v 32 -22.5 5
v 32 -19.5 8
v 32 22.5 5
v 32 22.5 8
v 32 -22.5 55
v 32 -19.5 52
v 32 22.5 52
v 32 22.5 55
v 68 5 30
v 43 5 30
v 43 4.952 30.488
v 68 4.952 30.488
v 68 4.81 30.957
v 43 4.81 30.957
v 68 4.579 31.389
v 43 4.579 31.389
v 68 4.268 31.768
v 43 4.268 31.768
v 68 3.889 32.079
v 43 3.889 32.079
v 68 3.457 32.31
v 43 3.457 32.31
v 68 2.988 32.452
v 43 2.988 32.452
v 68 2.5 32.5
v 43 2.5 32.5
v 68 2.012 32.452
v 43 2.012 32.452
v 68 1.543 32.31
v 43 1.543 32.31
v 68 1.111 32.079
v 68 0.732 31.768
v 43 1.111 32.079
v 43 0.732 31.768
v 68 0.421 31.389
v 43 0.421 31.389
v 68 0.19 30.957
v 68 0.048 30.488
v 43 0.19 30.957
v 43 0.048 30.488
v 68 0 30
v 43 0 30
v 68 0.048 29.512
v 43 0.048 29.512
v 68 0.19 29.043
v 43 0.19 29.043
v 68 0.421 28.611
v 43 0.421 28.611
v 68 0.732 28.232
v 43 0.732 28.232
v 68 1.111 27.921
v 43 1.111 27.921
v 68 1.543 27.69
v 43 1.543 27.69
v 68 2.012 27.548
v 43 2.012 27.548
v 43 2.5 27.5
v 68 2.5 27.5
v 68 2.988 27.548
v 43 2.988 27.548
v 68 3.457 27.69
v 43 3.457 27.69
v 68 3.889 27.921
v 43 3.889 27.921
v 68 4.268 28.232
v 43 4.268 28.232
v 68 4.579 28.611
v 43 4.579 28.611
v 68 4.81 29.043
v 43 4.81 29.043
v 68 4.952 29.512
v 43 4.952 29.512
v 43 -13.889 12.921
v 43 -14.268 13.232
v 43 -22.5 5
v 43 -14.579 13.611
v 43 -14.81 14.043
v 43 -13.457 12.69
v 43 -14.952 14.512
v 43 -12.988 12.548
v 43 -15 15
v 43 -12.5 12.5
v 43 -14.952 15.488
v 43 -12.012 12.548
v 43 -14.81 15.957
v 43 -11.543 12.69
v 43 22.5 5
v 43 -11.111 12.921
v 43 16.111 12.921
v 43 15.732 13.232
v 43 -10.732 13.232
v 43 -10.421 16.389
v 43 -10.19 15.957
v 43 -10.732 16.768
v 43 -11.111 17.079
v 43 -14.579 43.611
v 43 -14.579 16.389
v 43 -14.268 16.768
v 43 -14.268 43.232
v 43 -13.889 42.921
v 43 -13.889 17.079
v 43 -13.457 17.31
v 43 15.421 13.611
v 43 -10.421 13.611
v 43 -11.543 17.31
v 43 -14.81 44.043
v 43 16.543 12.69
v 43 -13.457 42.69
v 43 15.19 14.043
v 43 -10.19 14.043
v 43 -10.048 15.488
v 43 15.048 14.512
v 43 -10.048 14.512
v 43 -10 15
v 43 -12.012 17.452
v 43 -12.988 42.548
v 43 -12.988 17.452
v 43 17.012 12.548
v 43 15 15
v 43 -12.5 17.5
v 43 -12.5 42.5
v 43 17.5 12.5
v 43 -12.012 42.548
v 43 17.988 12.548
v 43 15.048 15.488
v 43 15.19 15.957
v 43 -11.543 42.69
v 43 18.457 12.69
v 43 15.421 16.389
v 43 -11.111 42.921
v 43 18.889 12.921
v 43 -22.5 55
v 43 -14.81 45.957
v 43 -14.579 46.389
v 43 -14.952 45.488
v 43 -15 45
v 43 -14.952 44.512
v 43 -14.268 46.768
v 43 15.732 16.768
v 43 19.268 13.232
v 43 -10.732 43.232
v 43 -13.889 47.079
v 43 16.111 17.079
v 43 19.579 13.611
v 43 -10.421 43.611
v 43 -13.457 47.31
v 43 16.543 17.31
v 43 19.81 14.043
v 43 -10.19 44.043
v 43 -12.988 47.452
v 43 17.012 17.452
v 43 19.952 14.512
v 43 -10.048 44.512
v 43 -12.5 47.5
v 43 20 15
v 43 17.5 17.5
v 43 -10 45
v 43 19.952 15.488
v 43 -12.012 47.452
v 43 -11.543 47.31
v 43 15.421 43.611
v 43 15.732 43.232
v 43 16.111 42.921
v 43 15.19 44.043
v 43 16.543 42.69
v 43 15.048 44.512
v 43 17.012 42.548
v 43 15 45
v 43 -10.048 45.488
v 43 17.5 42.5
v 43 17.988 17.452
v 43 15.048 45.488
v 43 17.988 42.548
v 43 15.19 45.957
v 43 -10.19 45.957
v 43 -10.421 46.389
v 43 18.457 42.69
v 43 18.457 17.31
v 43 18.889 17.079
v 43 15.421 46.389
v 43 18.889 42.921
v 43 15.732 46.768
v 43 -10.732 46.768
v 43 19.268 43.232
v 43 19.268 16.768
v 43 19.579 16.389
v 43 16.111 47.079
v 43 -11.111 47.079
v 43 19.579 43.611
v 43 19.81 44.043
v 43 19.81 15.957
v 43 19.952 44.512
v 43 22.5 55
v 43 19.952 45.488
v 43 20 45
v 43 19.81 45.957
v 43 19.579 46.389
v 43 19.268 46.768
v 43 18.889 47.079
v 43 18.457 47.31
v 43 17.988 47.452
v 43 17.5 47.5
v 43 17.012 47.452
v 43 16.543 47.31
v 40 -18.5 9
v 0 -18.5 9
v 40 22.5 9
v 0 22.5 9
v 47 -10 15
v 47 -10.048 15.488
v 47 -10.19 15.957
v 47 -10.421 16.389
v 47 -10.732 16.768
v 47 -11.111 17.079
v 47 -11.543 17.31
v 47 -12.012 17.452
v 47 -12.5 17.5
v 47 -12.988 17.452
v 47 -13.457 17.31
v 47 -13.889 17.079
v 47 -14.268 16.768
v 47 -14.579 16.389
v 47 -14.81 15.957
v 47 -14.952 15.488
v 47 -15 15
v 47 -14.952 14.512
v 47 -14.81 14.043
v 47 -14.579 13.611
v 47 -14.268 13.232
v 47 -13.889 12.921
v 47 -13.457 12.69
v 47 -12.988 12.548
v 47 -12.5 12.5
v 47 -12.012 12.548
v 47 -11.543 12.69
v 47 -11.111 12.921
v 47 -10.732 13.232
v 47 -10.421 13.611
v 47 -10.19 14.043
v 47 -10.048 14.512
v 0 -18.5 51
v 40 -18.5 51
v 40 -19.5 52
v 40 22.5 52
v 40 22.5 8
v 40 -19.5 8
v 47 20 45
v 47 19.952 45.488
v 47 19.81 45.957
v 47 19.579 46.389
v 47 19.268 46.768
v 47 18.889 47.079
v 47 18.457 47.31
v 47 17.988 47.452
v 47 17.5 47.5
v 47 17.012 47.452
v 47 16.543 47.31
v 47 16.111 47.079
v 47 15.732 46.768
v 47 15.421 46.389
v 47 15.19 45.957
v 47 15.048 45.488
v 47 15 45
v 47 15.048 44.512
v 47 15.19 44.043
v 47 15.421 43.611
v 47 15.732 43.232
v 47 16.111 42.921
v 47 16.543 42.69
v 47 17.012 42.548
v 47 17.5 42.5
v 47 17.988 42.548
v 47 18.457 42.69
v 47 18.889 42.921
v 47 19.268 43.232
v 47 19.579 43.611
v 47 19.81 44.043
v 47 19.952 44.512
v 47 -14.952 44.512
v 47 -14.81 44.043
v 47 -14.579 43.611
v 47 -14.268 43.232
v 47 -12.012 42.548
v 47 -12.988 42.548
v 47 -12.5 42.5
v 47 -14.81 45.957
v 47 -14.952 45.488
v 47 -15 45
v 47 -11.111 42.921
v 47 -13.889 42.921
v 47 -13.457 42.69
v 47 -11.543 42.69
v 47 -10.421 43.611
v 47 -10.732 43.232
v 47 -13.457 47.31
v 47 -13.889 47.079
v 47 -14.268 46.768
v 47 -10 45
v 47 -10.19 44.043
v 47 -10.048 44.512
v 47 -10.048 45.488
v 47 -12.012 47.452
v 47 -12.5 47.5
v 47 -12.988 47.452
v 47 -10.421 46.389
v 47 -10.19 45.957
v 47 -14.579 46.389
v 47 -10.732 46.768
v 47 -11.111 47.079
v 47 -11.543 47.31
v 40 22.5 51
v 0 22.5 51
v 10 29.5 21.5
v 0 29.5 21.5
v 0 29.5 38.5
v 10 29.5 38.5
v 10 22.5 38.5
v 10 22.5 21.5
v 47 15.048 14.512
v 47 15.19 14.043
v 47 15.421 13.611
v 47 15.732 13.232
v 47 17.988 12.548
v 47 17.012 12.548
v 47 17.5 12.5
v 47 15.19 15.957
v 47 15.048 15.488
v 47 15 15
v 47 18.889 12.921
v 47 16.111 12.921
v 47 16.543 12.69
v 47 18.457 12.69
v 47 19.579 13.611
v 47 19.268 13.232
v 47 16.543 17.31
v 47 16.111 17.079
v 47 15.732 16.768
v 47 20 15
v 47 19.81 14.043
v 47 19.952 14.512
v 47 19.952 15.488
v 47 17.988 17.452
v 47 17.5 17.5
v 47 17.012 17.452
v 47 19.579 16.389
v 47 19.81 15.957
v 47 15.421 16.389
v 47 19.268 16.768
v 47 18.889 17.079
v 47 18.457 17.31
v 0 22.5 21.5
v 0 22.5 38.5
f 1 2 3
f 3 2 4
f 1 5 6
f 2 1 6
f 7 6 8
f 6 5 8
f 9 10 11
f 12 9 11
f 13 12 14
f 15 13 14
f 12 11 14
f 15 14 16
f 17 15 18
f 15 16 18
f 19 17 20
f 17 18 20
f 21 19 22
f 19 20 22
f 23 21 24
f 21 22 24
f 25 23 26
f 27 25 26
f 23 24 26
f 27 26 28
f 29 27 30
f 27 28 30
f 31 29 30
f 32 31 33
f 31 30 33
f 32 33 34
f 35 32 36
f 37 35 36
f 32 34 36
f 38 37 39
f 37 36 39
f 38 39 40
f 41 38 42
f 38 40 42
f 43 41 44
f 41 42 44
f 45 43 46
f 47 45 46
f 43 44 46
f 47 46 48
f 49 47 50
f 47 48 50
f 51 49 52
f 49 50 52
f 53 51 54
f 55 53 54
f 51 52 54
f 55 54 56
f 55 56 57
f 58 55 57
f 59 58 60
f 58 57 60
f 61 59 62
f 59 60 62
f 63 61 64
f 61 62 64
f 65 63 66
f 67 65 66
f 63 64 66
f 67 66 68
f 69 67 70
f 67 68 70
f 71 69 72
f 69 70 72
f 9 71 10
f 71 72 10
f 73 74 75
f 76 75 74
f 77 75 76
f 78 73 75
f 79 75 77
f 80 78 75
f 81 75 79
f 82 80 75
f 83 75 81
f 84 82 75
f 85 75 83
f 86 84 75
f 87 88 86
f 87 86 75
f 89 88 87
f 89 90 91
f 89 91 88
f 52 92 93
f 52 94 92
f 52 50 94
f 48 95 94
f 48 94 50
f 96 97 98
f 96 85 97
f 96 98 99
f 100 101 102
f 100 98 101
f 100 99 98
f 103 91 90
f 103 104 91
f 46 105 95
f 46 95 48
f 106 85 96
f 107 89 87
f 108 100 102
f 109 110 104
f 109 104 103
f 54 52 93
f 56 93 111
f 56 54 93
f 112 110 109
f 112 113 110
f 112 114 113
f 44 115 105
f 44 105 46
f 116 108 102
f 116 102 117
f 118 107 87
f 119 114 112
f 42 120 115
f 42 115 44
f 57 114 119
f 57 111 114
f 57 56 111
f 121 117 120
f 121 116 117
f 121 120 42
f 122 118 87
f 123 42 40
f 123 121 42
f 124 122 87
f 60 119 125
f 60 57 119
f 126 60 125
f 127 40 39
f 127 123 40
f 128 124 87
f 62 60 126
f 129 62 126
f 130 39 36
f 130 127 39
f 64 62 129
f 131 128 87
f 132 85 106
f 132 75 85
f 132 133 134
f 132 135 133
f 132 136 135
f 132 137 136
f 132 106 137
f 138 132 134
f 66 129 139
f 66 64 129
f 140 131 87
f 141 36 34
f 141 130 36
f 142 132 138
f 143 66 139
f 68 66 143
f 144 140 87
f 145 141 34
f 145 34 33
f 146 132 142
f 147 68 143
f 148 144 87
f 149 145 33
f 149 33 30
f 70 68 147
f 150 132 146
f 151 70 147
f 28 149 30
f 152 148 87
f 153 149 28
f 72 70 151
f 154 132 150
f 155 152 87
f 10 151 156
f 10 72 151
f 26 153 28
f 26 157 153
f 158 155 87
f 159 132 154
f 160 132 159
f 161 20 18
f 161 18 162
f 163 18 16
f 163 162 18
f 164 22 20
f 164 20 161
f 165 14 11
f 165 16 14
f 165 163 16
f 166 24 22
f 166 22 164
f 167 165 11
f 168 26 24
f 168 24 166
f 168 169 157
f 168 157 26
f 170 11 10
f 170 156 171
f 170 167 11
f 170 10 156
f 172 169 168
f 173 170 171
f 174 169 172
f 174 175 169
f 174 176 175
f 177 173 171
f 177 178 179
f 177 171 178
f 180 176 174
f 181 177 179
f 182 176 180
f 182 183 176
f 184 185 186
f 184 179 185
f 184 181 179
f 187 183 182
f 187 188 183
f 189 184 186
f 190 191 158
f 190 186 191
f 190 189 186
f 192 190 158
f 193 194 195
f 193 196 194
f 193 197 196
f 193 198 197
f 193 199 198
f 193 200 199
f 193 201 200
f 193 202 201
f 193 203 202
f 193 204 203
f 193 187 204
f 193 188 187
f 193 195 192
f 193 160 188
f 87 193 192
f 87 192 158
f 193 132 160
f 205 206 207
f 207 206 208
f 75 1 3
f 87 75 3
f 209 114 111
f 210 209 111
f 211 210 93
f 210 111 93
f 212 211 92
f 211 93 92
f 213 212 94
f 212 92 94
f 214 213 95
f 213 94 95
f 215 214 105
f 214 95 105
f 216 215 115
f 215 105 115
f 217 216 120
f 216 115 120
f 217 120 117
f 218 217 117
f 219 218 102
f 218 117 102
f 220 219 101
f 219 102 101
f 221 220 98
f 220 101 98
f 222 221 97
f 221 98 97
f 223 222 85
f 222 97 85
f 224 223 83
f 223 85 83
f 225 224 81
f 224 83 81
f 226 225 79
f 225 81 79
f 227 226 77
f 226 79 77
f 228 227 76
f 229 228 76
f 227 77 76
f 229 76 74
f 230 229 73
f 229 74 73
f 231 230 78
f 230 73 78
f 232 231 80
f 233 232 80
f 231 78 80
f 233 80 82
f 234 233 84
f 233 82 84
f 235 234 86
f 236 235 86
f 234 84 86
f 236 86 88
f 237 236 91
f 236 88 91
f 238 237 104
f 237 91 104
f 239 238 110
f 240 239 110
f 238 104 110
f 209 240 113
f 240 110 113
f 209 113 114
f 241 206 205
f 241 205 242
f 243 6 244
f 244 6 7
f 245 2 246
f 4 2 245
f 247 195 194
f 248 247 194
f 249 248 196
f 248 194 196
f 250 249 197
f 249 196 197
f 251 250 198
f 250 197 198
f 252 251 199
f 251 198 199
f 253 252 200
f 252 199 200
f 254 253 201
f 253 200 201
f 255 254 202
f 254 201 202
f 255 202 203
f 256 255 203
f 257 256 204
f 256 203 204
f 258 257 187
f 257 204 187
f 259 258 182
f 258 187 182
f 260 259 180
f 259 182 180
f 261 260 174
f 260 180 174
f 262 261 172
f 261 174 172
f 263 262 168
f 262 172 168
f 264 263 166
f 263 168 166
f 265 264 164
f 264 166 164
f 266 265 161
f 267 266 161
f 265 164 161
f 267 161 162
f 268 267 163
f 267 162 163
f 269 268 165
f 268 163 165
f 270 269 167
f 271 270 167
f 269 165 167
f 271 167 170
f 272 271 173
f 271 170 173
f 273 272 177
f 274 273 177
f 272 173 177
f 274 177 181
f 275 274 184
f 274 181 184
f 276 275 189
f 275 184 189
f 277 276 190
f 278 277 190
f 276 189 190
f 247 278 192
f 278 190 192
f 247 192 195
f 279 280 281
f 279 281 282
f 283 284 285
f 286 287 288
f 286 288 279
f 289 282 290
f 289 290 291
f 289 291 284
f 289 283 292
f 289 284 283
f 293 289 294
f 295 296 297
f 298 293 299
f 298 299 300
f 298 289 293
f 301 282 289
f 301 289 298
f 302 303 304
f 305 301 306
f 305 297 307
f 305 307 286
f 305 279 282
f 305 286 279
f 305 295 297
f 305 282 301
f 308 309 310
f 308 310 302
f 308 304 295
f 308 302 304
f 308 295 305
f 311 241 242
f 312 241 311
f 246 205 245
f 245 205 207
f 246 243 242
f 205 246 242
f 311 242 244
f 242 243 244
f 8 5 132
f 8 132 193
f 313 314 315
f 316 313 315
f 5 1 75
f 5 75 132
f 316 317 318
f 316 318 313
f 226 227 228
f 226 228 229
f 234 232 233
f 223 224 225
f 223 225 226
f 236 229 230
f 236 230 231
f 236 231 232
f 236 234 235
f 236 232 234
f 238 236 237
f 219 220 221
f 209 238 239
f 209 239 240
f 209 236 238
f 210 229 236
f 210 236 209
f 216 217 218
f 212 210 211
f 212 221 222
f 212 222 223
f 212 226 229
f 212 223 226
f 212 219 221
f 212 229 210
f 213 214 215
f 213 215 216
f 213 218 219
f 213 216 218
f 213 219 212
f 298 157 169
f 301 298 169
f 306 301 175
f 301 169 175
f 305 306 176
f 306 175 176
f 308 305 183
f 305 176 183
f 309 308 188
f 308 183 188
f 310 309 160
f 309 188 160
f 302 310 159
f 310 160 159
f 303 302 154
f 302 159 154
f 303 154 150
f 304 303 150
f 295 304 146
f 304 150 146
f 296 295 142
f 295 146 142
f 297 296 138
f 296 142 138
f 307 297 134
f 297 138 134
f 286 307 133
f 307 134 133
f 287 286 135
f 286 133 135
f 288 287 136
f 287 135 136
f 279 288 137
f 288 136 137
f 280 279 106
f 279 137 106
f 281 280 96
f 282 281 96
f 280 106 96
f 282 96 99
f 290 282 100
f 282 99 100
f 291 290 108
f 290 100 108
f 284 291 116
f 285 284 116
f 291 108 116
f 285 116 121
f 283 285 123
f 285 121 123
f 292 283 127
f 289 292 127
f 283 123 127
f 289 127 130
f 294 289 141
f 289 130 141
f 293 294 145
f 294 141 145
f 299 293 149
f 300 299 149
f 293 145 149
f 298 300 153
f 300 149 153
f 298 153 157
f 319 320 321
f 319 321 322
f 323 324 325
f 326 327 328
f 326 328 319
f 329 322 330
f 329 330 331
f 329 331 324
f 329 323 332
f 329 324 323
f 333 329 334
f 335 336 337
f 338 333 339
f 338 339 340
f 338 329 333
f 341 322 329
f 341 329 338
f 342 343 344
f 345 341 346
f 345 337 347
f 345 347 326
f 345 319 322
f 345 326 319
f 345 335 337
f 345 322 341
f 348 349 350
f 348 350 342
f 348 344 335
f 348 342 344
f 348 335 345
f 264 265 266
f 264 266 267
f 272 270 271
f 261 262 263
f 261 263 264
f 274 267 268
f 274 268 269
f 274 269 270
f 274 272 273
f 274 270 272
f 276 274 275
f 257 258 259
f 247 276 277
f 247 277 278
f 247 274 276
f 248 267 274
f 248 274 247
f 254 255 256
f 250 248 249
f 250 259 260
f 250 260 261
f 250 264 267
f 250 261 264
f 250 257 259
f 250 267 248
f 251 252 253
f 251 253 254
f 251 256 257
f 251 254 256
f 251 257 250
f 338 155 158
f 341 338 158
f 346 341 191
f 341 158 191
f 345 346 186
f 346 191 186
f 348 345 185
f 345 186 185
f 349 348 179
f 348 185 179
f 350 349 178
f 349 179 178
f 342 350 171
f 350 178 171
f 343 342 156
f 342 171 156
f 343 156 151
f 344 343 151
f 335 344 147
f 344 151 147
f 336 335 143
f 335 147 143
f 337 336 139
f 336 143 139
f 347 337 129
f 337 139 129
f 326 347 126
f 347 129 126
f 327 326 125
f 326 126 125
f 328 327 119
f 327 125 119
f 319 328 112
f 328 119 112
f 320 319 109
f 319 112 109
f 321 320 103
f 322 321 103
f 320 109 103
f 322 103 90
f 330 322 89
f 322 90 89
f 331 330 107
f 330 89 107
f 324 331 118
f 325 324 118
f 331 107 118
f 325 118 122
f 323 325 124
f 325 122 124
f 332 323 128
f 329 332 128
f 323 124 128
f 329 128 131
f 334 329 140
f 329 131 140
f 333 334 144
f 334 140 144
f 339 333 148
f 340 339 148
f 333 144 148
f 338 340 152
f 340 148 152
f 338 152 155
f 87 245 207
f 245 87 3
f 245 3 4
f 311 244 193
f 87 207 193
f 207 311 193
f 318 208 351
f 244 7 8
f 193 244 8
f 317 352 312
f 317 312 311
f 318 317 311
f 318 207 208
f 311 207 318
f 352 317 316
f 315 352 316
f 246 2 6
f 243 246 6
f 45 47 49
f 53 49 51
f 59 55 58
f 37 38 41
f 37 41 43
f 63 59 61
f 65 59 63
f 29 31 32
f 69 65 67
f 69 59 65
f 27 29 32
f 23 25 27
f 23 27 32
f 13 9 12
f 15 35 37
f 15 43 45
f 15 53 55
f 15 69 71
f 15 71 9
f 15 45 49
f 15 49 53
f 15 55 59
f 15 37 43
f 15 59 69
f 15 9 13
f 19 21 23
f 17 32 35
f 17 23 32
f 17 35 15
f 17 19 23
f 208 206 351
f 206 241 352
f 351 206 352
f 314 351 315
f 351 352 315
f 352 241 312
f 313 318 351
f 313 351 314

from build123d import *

# Parameters (mm, degrees)
BOX005_W                  = 41
BOX005_H                  = 42
BOX005_DEPTH              = 40
BOX004_W                  = 7
BOX004_H                  = 17
BOX004_DEPTH              = 10
CYLINDER003_R             = 2.5
CYLINDER003_DEPTH         = 25
CYLINDER002_R             = 2.5
CYLINDER002_DEPTH         = 4
BOX006_W                  = 45
BOX006_H                  = 3
BOX006_DEPTH              = 8
BOX007_W                  = 3
BOX007_H                  = 50
BOX007_DEPTH              = 8
BOX003_W                  = 45
BOX003_H                  = 50
BOX003_DEPTH              = 3
FUSION002_ROLL_ANGLE      = 90
FUSION002_PLACEMENT_ANGLE = 90


with BuildPart() as base_motor:
    # Box005 → Box005 (new body)
    with BuildSketch(Plane(origin=(4, 4, 0), x_dir=(1, 0, 0), z_dir=(0, 0, 1))):
        with Locations((20.5, 21)):
            Rectangle(BOX005_W, BOX005_H)
    extrude(amount=BOX005_DEPTH)


with BuildPart() as alimentacion001:
    # Box004 → Box004 (new body)
    with BuildSketch(Plane(origin=(45, 16.5, 0), x_dir=(1, 0, 0), z_dir=(0, 0, 1))):
        with Locations((3.5, 8.5)):
            Rectangle(BOX004_W, BOX004_H)
    extrude(amount=BOX004_DEPTH)


with BuildPart() as motor:
    # Cylinder003 → Cylinder003 (new body)
    with BuildSketch(Plane(origin=(25, 25, 43), x_dir=(1, 0, 0), z_dir=(0, 0, 1))):
        Circle(CYLINDER003_R)
    extrude(amount=CYLINDER003_DEPTH)

    # Fusion003: union base motor, alimentacion001
    add(base_motor.part)
    add(alimentacion001.part)


with BuildPart() as tonillo_motor004:
    # Cylinder002 → Cylinder002 (new body)
    with BuildSketch(Plane(origin=(10, 10, 43), x_dir=(1, 0, 0), z_dir=(0, 0, 1))):
        Circle(CYLINDER002_R)
    extrude(amount=CYLINDER002_DEPTH)


with BuildPart() as tonillo_motor005:
    # Link003 base: copy of tonillo motor004
    add(tonillo_motor004.part)


with BuildPart() as tonillo_motor005_1:
    # Link003 placement: moved
    add(tonillo_motor005.part.moved(Location((30, 30, 0))))


with BuildPart() as tonillo_motor006:
    # Link004 base: copy of tonillo motor004
    add(tonillo_motor004.part)


with BuildPart() as tonillo_motor006_1:
    # Link004 placement: moved
    add(tonillo_motor006.part.moved(Location((30, 0, 0))))


with BuildPart() as tonillo_motor007:
    # Link005 base: copy of tonillo motor004
    add(tonillo_motor004.part)


with BuildPart() as tonillo_motor007_1:
    # Link005 placement: moved
    add(tonillo_motor007.part.moved(Location((0, 30, 0))))


with BuildPart() as lateral_izq:
    # Box006 → Box006 (new body)
    with BuildSketch(Plane.XY.offset(32)):
        with Locations((22.5, 1.5)):
            Rectangle(BOX006_W, BOX006_H)
    extrude(amount=BOX006_DEPTH)


with BuildPart() as lateral_der:
    # Link006 base: copy of lateral izq
    add(lateral_izq.part)


with BuildPart() as lateral_der_1:
    # Link006 placement: moved
    add(lateral_der.part.moved(Location((0, 47, 0))))


with BuildPart() as lateral_frente:
    # Box007 → Box007 (new body)
    with BuildSketch(Plane.XY.offset(32)):
        with Locations((1.5, 25)):
            Rectangle(BOX007_W, BOX007_H)
    extrude(amount=BOX007_DEPTH)


with BuildPart() as motor_completo:
    # Box003 → Box003 (new body)
    with BuildSketch(Plane.XY.offset(40)):
        with Locations((22.5, 25)):
            Rectangle(BOX003_W, BOX003_H)
    extrude(amount=BOX003_DEPTH)

    # Fusion004: union lateral izq, lateral der, lateral frente
    add(lateral_izq.part)
    add(lateral_der_1.part)
    add(lateral_frente.part)

    # Fusion002: union motor, tonillo motor005, tonillo motor006, tonillo motor007, tonillo motor004
    add(motor.part)
    add(tonillo_motor005_1.part)
    add(tonillo_motor006_1.part)
    add(tonillo_motor007_1.part)
    add(tonillo_motor004.part)


with BuildPart() as motor_completo_1:
    # Fusion002 roll: moved
    add(motor_completo.part.rotate(Axis((0, 0, 0), (1, 0, 0)), FUSION002_ROLL_ANGLE))


with BuildPart() as motor_completo_2:
    # Fusion002 placement: moved
    add(motor_completo_1.part.moved(Location((0, -22.5, 5))).rotate(Axis((0, -22.5, 5), (0, 0, 1)), FUSION002_PLACEMENT_ANGLE))


solid = motor_completo_2.part
